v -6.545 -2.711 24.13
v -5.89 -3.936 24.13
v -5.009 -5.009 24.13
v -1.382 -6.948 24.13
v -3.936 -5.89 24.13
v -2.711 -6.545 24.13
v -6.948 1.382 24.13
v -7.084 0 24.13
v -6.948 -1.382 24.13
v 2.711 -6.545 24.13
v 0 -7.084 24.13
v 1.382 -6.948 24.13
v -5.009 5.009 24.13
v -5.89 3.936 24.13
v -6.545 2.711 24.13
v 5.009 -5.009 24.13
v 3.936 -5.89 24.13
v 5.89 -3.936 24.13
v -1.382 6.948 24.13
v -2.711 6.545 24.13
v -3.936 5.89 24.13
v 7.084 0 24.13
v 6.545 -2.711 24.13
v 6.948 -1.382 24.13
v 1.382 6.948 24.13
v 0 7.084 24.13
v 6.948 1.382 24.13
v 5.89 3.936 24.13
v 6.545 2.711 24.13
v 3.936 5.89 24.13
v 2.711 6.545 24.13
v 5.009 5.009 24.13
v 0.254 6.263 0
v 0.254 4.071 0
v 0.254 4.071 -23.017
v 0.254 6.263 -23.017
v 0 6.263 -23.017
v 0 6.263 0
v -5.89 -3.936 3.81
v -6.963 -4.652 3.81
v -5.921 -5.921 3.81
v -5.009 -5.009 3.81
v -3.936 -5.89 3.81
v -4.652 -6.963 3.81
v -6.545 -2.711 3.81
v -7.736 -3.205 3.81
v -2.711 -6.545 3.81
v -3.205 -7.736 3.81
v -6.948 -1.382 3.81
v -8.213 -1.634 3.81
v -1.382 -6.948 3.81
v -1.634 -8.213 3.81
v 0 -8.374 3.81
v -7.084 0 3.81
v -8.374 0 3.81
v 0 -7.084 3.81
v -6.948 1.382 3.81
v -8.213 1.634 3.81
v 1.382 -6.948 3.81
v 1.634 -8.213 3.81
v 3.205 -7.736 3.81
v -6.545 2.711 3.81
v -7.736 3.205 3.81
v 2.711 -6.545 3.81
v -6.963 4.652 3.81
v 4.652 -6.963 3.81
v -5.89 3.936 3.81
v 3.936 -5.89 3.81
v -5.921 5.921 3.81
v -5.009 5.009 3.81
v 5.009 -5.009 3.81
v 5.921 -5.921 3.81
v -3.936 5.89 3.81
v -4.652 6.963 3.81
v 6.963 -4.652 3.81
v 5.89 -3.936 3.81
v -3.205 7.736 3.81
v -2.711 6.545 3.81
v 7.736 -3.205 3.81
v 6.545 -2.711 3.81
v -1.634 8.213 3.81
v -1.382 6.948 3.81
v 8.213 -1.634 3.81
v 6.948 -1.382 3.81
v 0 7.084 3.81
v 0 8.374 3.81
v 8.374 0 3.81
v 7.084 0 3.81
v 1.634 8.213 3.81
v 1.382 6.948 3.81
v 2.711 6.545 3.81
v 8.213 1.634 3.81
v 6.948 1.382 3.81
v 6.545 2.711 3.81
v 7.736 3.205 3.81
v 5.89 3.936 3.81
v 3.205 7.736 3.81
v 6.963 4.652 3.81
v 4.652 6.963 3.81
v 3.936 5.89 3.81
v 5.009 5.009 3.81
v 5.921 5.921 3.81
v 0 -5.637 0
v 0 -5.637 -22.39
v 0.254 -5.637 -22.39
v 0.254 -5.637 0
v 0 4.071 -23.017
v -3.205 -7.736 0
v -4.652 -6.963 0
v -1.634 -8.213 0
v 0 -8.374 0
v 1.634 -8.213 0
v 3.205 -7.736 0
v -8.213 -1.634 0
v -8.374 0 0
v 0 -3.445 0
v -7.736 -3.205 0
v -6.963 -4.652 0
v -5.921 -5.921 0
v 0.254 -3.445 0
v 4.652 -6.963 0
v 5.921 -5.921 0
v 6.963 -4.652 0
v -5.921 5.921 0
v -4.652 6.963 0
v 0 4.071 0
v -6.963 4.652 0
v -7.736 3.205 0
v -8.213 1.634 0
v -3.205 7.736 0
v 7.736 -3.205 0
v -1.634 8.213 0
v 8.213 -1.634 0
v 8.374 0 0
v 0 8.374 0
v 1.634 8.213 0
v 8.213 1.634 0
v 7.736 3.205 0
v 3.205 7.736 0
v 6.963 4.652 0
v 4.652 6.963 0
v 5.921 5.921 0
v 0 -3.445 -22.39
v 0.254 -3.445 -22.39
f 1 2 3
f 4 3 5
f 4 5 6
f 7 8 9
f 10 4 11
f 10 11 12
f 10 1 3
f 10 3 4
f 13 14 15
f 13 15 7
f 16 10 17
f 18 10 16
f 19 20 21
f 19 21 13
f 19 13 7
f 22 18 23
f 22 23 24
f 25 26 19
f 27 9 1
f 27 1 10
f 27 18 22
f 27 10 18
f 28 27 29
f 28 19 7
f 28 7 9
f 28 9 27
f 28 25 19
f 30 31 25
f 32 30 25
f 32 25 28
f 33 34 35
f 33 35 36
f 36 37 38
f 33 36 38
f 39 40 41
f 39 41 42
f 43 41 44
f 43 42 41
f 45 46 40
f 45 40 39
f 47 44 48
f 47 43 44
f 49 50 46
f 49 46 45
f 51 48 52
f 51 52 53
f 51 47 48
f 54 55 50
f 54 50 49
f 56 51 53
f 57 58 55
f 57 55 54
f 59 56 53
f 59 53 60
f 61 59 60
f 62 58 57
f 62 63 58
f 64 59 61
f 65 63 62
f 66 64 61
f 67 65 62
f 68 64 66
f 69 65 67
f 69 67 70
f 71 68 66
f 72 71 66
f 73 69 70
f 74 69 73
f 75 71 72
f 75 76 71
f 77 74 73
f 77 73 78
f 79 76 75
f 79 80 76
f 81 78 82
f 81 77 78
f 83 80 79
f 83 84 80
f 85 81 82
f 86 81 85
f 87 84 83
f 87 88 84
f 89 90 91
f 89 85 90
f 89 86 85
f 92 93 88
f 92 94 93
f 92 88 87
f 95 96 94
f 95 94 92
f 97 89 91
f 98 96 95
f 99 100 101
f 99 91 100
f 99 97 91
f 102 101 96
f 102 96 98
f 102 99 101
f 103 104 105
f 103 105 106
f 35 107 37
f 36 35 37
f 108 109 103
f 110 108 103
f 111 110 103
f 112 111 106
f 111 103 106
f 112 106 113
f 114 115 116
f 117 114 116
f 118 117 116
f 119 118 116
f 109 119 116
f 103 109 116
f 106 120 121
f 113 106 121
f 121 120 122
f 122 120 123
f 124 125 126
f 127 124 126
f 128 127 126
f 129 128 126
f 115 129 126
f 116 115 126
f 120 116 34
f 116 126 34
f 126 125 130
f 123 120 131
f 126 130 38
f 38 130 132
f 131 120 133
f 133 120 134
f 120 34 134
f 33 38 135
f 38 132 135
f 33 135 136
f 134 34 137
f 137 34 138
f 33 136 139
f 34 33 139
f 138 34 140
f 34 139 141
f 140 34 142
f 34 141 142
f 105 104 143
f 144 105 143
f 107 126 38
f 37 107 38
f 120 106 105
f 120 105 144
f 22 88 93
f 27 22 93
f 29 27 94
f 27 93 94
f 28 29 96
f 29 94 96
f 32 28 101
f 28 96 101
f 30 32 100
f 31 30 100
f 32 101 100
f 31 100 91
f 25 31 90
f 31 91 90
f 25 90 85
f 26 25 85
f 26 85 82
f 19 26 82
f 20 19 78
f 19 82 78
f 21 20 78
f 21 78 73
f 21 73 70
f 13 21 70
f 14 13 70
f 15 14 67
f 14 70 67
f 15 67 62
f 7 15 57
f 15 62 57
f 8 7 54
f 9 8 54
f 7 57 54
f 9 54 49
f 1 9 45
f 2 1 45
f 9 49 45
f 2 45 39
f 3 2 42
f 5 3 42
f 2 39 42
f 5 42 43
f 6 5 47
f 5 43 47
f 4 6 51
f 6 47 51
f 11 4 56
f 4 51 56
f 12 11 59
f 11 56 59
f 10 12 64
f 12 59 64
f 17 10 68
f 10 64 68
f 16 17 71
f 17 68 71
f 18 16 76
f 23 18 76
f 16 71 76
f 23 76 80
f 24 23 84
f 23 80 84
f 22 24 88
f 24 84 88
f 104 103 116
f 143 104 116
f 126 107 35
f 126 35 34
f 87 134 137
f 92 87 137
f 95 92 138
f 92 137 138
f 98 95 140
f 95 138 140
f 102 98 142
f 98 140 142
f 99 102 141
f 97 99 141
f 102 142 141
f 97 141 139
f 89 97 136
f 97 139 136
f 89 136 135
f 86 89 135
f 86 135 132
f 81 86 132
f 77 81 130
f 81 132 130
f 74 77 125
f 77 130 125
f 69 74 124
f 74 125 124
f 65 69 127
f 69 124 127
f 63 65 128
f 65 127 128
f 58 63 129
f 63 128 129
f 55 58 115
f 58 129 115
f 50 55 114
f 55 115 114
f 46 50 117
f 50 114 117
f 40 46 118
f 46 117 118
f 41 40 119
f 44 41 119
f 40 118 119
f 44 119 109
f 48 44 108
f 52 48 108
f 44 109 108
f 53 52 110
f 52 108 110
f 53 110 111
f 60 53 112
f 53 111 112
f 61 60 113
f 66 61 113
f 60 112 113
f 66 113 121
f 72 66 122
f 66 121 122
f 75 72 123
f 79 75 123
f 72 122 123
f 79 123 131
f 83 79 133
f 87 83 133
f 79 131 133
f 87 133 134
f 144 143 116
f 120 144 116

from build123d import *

# Parameters (mm, degrees)
F0_R     = 8.37382
F1_DEPTH = 3.81
F2_R     = 7.084201
F3_DEPTH = 20.32
F4_W     = 2.192053
F4_H     = 23.016576
F5_DEPTH = 0.254
F6_W     = 2.192054
F6_H     = 22.390274
F7_DEPTH = 0.254


with BuildPart() as f1:
    # F0 (on Top) → F1 (new body)
    with BuildSketch(Plane.XY):
        Circle(F0_R)
    extrude(amount=F1_DEPTH)

    # F2 (on face) → F3 (join)
    with BuildSketch(Plane.XY.offset(3.81)):
        Circle(F2_R)
    extrude(amount=F3_DEPTH)

    # F4 (on Right) → F5 (join)
    with BuildSketch(Plane.YZ):
        with Locations((5.166987, -11.508288)):
            Rectangle(F4_W, F4_H)
    extrude(amount=F5_DEPTH)

    # F6 (on Right) → F7 (join)
    with BuildSketch(Plane.YZ):
        with Locations((-4.540686, -11.195137)):
            Rectangle(F6_W, F6_H)
    extrude(amount=F7_DEPTH)


solid = f1.part
